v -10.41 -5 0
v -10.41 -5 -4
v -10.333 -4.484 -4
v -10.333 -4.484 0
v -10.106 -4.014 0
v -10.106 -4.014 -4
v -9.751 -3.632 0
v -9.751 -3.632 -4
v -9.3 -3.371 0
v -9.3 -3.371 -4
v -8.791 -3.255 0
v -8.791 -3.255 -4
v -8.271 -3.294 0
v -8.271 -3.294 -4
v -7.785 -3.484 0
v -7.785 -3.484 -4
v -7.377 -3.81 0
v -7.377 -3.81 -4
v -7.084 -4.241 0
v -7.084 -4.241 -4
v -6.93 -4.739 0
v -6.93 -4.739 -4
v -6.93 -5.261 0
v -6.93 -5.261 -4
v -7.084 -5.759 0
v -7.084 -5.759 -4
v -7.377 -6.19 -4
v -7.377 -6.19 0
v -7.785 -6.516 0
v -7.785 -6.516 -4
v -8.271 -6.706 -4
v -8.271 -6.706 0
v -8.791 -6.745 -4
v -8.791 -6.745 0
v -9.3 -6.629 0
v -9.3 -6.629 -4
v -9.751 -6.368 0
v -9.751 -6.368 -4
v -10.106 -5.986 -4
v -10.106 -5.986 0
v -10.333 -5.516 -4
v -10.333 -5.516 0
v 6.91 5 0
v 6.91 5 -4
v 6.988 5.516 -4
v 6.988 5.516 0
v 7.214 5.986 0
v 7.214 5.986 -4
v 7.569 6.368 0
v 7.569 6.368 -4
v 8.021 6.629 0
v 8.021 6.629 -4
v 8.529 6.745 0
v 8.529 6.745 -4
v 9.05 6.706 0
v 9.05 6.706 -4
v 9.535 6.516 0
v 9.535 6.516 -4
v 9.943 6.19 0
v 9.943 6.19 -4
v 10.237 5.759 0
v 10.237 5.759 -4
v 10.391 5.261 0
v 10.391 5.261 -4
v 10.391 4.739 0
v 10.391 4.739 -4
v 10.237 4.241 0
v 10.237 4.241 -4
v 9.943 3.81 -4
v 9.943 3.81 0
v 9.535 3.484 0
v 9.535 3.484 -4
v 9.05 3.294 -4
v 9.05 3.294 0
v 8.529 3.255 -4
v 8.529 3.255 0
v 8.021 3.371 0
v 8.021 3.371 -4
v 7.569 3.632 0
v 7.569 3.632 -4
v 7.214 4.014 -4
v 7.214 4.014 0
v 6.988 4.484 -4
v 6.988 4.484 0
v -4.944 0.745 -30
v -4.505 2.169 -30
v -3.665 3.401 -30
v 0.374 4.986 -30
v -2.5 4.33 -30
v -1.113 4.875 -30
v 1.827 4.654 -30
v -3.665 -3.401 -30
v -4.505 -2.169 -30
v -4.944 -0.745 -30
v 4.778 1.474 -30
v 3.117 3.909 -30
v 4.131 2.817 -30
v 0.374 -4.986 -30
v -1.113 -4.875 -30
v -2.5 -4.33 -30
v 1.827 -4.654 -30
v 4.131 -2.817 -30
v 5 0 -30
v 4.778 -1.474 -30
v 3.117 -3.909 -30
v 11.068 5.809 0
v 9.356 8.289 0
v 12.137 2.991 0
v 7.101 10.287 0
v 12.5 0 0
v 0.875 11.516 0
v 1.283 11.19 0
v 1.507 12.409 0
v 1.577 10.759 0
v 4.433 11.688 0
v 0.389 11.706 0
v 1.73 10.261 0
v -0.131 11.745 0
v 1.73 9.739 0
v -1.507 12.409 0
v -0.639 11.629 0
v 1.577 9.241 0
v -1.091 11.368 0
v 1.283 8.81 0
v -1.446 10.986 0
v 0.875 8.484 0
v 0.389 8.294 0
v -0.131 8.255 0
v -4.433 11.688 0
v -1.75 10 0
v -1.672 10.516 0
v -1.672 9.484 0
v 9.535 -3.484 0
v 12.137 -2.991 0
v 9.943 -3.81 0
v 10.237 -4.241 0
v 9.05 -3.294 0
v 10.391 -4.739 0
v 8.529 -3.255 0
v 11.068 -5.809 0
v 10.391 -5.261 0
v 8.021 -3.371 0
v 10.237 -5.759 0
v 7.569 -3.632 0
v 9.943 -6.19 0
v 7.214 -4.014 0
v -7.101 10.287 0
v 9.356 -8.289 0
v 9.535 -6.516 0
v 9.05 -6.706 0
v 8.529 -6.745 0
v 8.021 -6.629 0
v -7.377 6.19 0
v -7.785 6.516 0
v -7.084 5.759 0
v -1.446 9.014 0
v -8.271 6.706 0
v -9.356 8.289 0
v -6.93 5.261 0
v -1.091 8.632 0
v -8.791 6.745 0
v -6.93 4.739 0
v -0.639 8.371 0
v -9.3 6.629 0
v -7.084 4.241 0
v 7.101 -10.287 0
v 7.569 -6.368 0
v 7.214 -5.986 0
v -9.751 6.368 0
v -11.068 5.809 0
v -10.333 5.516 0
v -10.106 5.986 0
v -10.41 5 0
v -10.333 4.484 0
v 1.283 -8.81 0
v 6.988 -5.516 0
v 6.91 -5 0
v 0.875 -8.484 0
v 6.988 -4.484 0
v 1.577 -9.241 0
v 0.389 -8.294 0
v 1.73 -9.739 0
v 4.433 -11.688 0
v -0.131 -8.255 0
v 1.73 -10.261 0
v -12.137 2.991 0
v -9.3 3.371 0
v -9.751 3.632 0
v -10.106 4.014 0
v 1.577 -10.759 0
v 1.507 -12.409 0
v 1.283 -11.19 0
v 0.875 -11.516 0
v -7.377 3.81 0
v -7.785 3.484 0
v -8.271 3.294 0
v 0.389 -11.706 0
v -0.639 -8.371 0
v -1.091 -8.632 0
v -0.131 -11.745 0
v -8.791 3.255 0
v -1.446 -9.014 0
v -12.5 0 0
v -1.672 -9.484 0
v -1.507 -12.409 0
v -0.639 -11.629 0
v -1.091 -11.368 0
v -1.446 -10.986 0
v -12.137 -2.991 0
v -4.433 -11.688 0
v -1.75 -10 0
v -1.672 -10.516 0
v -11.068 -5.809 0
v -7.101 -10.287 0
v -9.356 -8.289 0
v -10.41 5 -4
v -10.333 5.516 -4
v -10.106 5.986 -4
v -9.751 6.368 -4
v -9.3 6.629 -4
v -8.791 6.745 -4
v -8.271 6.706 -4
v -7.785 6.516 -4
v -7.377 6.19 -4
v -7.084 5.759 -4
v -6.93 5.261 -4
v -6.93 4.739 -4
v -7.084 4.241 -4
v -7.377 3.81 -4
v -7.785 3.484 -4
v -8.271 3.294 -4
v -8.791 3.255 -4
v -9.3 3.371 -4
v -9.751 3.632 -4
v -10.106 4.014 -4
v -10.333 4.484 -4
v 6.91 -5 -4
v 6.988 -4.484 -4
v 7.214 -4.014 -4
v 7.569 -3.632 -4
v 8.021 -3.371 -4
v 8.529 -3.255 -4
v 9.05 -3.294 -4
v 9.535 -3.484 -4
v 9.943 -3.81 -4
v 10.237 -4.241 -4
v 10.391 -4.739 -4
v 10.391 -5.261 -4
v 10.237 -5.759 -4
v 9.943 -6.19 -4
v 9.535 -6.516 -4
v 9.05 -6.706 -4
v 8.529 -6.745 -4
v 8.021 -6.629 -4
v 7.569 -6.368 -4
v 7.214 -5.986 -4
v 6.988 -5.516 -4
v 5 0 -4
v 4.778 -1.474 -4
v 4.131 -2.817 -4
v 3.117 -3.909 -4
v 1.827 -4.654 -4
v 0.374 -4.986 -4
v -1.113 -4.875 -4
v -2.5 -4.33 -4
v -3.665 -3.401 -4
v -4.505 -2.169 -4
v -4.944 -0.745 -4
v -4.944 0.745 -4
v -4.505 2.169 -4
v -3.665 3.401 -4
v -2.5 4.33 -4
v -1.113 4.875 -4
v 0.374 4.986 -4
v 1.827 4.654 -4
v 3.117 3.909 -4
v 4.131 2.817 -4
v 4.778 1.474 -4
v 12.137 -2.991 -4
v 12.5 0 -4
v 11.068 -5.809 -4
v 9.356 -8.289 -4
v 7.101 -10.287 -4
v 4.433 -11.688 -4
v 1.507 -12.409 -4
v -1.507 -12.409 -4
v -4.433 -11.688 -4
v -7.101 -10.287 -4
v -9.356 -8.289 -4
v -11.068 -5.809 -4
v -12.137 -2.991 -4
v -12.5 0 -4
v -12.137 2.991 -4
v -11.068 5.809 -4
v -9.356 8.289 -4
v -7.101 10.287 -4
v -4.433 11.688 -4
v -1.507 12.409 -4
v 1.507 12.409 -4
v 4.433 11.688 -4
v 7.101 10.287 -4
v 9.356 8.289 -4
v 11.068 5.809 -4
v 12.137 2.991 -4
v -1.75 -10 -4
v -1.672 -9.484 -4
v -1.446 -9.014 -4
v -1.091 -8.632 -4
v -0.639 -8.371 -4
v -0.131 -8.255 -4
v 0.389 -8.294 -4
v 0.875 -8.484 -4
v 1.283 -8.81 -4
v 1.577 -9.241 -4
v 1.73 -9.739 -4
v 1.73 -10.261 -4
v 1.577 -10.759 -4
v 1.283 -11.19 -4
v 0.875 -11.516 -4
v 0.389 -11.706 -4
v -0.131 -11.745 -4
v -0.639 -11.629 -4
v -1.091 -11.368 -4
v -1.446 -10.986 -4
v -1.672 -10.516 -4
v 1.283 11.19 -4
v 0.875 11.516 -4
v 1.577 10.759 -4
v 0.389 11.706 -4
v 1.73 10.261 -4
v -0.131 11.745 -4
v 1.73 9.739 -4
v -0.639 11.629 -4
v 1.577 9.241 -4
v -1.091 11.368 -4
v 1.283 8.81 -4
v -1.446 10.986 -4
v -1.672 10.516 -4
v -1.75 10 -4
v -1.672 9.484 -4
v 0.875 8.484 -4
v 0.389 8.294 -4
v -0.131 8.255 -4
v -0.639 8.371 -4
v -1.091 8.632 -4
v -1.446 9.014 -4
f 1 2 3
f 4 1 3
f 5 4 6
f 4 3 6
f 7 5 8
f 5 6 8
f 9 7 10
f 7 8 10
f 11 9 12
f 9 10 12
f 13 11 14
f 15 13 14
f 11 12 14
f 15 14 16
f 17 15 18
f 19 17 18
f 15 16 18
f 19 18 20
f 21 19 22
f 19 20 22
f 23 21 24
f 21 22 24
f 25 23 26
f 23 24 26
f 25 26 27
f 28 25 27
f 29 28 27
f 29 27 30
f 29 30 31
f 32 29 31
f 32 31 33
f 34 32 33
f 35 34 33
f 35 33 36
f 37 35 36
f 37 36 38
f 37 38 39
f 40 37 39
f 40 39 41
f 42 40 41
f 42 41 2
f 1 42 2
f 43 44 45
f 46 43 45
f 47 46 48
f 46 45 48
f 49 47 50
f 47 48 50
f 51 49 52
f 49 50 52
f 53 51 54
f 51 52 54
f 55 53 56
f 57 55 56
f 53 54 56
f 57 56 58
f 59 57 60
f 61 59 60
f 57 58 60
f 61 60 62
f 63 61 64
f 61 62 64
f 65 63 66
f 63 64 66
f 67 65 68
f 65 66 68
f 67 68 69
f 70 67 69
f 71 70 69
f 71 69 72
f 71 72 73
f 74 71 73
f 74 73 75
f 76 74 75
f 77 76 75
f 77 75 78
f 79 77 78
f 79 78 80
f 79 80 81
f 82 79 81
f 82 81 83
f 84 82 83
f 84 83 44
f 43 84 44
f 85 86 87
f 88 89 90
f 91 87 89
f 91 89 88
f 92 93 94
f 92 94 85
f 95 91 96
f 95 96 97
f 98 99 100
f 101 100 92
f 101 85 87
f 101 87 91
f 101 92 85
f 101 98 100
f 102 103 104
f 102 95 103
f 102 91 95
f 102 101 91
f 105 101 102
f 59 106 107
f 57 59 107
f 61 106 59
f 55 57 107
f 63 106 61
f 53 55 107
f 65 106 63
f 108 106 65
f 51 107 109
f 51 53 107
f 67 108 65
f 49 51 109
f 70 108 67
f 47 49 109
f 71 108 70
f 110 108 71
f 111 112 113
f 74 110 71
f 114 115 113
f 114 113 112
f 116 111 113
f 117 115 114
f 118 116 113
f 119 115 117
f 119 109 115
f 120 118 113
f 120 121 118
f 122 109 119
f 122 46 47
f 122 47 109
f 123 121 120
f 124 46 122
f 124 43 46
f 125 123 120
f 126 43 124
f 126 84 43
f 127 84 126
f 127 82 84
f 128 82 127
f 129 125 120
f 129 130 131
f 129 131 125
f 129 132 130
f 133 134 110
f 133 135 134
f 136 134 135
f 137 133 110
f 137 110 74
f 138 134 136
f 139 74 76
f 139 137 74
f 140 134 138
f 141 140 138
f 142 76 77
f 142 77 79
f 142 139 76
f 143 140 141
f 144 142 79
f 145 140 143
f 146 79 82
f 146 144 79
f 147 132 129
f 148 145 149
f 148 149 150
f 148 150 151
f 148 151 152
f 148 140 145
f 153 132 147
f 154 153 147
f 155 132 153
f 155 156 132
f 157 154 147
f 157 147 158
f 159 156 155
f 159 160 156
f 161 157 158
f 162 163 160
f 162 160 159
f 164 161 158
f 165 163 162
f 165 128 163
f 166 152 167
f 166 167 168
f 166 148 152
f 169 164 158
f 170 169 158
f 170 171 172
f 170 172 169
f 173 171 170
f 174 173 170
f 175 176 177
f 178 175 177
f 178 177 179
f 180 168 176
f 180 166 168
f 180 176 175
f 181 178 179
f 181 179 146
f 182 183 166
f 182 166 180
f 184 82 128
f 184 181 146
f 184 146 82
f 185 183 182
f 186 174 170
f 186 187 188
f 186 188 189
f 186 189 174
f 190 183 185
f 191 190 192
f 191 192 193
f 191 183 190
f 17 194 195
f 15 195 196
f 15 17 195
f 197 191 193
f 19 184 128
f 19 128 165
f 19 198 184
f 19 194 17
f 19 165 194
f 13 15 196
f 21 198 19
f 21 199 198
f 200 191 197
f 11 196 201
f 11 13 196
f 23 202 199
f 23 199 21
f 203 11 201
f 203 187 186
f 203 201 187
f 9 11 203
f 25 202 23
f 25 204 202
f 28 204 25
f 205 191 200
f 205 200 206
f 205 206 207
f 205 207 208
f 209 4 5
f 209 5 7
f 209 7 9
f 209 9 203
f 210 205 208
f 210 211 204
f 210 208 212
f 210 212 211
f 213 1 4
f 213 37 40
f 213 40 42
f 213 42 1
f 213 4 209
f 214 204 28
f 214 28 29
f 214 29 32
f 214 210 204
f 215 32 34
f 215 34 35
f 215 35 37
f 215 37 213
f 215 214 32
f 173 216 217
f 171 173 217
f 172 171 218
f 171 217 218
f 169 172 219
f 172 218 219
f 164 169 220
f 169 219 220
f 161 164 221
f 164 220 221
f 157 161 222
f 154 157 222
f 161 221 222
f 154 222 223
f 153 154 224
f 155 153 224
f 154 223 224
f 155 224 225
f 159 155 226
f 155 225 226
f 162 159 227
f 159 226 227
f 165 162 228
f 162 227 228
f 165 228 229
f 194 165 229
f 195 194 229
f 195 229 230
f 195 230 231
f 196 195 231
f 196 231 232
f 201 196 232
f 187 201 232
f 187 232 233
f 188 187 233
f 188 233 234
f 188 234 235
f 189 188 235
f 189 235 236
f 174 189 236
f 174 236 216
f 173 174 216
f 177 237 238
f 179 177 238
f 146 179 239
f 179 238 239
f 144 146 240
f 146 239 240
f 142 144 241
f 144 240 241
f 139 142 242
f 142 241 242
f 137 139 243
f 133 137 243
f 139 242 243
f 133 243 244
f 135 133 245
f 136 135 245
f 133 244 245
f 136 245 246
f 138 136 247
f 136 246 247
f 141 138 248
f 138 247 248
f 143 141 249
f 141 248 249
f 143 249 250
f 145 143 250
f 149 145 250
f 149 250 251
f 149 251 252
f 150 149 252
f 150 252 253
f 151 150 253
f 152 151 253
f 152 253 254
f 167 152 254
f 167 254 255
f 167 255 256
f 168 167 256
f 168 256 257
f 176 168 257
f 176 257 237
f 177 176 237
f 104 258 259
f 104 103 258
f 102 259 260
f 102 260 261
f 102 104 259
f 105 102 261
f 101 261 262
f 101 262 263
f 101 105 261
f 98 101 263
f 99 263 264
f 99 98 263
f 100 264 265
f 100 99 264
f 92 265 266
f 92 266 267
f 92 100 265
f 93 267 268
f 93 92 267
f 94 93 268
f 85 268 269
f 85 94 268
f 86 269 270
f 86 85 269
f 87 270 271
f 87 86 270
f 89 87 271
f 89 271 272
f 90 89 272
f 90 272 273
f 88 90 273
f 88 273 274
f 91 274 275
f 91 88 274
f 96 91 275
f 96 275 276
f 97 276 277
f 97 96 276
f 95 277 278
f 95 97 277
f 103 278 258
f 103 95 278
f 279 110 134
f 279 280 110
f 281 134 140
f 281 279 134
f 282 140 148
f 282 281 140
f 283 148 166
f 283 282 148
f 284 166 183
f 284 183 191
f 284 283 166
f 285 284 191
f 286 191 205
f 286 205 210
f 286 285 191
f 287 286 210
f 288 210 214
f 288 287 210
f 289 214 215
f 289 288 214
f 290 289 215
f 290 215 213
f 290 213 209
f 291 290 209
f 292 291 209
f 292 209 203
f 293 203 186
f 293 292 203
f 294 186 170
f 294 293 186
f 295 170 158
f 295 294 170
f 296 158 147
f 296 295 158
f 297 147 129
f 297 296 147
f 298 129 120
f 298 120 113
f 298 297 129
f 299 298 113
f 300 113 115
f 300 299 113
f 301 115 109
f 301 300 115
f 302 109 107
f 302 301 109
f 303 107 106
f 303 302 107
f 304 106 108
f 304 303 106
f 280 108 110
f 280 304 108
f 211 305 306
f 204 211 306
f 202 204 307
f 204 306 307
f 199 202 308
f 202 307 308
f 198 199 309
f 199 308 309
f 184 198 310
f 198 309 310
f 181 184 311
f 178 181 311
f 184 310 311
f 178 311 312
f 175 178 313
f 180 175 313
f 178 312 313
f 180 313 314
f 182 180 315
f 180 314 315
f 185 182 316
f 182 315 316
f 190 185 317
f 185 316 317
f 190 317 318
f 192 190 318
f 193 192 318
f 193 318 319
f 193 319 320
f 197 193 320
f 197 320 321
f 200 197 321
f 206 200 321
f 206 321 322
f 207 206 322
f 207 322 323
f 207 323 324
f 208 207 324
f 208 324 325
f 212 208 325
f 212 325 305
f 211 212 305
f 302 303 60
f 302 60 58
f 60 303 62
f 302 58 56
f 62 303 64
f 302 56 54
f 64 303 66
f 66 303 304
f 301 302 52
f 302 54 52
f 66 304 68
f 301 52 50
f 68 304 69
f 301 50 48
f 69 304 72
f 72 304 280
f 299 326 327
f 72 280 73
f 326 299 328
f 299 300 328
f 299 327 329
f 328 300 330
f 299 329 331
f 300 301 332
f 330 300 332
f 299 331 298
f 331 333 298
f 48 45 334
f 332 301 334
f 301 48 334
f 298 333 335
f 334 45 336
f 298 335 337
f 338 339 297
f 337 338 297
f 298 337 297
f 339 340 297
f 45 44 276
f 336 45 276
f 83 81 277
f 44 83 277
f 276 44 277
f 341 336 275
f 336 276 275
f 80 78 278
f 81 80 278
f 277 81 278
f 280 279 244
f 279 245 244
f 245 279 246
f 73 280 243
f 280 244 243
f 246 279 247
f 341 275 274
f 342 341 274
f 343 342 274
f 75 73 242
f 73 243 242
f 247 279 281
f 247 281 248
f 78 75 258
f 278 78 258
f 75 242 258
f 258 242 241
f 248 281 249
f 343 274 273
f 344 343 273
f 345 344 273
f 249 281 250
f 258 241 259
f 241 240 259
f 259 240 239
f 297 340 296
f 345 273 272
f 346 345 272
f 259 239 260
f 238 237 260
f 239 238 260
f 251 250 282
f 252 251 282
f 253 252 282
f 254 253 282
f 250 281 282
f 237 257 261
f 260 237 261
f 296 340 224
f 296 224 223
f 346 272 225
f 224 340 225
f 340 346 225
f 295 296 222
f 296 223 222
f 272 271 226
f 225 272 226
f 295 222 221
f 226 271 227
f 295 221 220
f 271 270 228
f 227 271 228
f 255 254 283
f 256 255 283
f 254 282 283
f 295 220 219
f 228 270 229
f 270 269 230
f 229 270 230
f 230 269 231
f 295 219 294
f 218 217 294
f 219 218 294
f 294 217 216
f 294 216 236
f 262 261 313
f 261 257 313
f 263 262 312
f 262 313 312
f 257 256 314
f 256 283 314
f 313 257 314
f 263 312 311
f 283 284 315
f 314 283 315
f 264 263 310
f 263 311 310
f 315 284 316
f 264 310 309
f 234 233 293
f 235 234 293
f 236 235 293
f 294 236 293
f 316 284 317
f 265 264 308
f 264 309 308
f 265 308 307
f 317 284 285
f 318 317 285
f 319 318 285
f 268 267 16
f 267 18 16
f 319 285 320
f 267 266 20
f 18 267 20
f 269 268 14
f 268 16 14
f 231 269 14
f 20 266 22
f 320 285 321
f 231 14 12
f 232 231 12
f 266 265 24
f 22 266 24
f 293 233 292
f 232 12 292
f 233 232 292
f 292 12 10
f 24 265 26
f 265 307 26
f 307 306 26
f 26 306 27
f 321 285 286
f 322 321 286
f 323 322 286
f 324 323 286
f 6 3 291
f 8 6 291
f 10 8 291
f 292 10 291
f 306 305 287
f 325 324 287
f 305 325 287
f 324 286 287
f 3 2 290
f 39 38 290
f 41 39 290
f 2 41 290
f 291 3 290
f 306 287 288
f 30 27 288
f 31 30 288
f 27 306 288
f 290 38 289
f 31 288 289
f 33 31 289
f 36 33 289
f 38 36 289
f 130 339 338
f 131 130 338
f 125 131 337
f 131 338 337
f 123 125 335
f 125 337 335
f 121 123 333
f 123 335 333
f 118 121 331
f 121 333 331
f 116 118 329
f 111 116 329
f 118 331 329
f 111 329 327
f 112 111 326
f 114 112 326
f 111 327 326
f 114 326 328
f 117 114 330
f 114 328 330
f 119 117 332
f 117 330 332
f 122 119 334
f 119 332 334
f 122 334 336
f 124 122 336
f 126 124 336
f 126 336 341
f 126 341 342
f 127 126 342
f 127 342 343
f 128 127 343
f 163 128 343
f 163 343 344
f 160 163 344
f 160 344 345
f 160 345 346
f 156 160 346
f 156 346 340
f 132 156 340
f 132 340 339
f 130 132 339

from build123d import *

# Parameters (mm, degrees)
SKETCH_1_W          = 7.5
SKETCH_1_H          = 4
SKETCH_2_R          = 1.75
CUT_EXTRUDE_1_DEPTH = 5


with BuildPart() as part:
    # 草圖1 → 旋轉1 (revolve)
    with BuildSketch(Plane(origin=(0, 0, 0), x_dir=(1, 0, 0), z_dir=(0, 1, 0))):
        Polygon((0, 30), (0, 0), (5, 0), (5, 4), (5, 30), align=None)
        with Locations((8.75, 2)):
            Rectangle(SKETCH_1_W, SKETCH_1_H)
    revolve(axis=Axis((0, 0, 0), (0, 0, -1)))

    # 草圖2 → 除料-伸長1 (cut, through all)
    with BuildSketch(Plane(origin=(0, 0, -4), x_dir=(-1, 0, 0), z_dir=(0, 0, -1))):
        with Locations((0, 10)):
            Circle(SKETCH_2_R)
        with Locations((8.660254038, 5)):
            Circle(SKETCH_2_R)
        with Locations((8.660254038, -5)):
            Circle(SKETCH_2_R)
        with Locations((0, -10)):
            Circle(SKETCH_2_R)
        with Locations((-8.660254038, -5)):
            Circle(SKETCH_2_R)
        with Locations((-8.660254038, 5)):
            Circle(SKETCH_2_R)
    extrude(amount=-CUT_EXTRUDE_1_DEPTH, mode=Mode.SUBTRACT)


solid = part.part
